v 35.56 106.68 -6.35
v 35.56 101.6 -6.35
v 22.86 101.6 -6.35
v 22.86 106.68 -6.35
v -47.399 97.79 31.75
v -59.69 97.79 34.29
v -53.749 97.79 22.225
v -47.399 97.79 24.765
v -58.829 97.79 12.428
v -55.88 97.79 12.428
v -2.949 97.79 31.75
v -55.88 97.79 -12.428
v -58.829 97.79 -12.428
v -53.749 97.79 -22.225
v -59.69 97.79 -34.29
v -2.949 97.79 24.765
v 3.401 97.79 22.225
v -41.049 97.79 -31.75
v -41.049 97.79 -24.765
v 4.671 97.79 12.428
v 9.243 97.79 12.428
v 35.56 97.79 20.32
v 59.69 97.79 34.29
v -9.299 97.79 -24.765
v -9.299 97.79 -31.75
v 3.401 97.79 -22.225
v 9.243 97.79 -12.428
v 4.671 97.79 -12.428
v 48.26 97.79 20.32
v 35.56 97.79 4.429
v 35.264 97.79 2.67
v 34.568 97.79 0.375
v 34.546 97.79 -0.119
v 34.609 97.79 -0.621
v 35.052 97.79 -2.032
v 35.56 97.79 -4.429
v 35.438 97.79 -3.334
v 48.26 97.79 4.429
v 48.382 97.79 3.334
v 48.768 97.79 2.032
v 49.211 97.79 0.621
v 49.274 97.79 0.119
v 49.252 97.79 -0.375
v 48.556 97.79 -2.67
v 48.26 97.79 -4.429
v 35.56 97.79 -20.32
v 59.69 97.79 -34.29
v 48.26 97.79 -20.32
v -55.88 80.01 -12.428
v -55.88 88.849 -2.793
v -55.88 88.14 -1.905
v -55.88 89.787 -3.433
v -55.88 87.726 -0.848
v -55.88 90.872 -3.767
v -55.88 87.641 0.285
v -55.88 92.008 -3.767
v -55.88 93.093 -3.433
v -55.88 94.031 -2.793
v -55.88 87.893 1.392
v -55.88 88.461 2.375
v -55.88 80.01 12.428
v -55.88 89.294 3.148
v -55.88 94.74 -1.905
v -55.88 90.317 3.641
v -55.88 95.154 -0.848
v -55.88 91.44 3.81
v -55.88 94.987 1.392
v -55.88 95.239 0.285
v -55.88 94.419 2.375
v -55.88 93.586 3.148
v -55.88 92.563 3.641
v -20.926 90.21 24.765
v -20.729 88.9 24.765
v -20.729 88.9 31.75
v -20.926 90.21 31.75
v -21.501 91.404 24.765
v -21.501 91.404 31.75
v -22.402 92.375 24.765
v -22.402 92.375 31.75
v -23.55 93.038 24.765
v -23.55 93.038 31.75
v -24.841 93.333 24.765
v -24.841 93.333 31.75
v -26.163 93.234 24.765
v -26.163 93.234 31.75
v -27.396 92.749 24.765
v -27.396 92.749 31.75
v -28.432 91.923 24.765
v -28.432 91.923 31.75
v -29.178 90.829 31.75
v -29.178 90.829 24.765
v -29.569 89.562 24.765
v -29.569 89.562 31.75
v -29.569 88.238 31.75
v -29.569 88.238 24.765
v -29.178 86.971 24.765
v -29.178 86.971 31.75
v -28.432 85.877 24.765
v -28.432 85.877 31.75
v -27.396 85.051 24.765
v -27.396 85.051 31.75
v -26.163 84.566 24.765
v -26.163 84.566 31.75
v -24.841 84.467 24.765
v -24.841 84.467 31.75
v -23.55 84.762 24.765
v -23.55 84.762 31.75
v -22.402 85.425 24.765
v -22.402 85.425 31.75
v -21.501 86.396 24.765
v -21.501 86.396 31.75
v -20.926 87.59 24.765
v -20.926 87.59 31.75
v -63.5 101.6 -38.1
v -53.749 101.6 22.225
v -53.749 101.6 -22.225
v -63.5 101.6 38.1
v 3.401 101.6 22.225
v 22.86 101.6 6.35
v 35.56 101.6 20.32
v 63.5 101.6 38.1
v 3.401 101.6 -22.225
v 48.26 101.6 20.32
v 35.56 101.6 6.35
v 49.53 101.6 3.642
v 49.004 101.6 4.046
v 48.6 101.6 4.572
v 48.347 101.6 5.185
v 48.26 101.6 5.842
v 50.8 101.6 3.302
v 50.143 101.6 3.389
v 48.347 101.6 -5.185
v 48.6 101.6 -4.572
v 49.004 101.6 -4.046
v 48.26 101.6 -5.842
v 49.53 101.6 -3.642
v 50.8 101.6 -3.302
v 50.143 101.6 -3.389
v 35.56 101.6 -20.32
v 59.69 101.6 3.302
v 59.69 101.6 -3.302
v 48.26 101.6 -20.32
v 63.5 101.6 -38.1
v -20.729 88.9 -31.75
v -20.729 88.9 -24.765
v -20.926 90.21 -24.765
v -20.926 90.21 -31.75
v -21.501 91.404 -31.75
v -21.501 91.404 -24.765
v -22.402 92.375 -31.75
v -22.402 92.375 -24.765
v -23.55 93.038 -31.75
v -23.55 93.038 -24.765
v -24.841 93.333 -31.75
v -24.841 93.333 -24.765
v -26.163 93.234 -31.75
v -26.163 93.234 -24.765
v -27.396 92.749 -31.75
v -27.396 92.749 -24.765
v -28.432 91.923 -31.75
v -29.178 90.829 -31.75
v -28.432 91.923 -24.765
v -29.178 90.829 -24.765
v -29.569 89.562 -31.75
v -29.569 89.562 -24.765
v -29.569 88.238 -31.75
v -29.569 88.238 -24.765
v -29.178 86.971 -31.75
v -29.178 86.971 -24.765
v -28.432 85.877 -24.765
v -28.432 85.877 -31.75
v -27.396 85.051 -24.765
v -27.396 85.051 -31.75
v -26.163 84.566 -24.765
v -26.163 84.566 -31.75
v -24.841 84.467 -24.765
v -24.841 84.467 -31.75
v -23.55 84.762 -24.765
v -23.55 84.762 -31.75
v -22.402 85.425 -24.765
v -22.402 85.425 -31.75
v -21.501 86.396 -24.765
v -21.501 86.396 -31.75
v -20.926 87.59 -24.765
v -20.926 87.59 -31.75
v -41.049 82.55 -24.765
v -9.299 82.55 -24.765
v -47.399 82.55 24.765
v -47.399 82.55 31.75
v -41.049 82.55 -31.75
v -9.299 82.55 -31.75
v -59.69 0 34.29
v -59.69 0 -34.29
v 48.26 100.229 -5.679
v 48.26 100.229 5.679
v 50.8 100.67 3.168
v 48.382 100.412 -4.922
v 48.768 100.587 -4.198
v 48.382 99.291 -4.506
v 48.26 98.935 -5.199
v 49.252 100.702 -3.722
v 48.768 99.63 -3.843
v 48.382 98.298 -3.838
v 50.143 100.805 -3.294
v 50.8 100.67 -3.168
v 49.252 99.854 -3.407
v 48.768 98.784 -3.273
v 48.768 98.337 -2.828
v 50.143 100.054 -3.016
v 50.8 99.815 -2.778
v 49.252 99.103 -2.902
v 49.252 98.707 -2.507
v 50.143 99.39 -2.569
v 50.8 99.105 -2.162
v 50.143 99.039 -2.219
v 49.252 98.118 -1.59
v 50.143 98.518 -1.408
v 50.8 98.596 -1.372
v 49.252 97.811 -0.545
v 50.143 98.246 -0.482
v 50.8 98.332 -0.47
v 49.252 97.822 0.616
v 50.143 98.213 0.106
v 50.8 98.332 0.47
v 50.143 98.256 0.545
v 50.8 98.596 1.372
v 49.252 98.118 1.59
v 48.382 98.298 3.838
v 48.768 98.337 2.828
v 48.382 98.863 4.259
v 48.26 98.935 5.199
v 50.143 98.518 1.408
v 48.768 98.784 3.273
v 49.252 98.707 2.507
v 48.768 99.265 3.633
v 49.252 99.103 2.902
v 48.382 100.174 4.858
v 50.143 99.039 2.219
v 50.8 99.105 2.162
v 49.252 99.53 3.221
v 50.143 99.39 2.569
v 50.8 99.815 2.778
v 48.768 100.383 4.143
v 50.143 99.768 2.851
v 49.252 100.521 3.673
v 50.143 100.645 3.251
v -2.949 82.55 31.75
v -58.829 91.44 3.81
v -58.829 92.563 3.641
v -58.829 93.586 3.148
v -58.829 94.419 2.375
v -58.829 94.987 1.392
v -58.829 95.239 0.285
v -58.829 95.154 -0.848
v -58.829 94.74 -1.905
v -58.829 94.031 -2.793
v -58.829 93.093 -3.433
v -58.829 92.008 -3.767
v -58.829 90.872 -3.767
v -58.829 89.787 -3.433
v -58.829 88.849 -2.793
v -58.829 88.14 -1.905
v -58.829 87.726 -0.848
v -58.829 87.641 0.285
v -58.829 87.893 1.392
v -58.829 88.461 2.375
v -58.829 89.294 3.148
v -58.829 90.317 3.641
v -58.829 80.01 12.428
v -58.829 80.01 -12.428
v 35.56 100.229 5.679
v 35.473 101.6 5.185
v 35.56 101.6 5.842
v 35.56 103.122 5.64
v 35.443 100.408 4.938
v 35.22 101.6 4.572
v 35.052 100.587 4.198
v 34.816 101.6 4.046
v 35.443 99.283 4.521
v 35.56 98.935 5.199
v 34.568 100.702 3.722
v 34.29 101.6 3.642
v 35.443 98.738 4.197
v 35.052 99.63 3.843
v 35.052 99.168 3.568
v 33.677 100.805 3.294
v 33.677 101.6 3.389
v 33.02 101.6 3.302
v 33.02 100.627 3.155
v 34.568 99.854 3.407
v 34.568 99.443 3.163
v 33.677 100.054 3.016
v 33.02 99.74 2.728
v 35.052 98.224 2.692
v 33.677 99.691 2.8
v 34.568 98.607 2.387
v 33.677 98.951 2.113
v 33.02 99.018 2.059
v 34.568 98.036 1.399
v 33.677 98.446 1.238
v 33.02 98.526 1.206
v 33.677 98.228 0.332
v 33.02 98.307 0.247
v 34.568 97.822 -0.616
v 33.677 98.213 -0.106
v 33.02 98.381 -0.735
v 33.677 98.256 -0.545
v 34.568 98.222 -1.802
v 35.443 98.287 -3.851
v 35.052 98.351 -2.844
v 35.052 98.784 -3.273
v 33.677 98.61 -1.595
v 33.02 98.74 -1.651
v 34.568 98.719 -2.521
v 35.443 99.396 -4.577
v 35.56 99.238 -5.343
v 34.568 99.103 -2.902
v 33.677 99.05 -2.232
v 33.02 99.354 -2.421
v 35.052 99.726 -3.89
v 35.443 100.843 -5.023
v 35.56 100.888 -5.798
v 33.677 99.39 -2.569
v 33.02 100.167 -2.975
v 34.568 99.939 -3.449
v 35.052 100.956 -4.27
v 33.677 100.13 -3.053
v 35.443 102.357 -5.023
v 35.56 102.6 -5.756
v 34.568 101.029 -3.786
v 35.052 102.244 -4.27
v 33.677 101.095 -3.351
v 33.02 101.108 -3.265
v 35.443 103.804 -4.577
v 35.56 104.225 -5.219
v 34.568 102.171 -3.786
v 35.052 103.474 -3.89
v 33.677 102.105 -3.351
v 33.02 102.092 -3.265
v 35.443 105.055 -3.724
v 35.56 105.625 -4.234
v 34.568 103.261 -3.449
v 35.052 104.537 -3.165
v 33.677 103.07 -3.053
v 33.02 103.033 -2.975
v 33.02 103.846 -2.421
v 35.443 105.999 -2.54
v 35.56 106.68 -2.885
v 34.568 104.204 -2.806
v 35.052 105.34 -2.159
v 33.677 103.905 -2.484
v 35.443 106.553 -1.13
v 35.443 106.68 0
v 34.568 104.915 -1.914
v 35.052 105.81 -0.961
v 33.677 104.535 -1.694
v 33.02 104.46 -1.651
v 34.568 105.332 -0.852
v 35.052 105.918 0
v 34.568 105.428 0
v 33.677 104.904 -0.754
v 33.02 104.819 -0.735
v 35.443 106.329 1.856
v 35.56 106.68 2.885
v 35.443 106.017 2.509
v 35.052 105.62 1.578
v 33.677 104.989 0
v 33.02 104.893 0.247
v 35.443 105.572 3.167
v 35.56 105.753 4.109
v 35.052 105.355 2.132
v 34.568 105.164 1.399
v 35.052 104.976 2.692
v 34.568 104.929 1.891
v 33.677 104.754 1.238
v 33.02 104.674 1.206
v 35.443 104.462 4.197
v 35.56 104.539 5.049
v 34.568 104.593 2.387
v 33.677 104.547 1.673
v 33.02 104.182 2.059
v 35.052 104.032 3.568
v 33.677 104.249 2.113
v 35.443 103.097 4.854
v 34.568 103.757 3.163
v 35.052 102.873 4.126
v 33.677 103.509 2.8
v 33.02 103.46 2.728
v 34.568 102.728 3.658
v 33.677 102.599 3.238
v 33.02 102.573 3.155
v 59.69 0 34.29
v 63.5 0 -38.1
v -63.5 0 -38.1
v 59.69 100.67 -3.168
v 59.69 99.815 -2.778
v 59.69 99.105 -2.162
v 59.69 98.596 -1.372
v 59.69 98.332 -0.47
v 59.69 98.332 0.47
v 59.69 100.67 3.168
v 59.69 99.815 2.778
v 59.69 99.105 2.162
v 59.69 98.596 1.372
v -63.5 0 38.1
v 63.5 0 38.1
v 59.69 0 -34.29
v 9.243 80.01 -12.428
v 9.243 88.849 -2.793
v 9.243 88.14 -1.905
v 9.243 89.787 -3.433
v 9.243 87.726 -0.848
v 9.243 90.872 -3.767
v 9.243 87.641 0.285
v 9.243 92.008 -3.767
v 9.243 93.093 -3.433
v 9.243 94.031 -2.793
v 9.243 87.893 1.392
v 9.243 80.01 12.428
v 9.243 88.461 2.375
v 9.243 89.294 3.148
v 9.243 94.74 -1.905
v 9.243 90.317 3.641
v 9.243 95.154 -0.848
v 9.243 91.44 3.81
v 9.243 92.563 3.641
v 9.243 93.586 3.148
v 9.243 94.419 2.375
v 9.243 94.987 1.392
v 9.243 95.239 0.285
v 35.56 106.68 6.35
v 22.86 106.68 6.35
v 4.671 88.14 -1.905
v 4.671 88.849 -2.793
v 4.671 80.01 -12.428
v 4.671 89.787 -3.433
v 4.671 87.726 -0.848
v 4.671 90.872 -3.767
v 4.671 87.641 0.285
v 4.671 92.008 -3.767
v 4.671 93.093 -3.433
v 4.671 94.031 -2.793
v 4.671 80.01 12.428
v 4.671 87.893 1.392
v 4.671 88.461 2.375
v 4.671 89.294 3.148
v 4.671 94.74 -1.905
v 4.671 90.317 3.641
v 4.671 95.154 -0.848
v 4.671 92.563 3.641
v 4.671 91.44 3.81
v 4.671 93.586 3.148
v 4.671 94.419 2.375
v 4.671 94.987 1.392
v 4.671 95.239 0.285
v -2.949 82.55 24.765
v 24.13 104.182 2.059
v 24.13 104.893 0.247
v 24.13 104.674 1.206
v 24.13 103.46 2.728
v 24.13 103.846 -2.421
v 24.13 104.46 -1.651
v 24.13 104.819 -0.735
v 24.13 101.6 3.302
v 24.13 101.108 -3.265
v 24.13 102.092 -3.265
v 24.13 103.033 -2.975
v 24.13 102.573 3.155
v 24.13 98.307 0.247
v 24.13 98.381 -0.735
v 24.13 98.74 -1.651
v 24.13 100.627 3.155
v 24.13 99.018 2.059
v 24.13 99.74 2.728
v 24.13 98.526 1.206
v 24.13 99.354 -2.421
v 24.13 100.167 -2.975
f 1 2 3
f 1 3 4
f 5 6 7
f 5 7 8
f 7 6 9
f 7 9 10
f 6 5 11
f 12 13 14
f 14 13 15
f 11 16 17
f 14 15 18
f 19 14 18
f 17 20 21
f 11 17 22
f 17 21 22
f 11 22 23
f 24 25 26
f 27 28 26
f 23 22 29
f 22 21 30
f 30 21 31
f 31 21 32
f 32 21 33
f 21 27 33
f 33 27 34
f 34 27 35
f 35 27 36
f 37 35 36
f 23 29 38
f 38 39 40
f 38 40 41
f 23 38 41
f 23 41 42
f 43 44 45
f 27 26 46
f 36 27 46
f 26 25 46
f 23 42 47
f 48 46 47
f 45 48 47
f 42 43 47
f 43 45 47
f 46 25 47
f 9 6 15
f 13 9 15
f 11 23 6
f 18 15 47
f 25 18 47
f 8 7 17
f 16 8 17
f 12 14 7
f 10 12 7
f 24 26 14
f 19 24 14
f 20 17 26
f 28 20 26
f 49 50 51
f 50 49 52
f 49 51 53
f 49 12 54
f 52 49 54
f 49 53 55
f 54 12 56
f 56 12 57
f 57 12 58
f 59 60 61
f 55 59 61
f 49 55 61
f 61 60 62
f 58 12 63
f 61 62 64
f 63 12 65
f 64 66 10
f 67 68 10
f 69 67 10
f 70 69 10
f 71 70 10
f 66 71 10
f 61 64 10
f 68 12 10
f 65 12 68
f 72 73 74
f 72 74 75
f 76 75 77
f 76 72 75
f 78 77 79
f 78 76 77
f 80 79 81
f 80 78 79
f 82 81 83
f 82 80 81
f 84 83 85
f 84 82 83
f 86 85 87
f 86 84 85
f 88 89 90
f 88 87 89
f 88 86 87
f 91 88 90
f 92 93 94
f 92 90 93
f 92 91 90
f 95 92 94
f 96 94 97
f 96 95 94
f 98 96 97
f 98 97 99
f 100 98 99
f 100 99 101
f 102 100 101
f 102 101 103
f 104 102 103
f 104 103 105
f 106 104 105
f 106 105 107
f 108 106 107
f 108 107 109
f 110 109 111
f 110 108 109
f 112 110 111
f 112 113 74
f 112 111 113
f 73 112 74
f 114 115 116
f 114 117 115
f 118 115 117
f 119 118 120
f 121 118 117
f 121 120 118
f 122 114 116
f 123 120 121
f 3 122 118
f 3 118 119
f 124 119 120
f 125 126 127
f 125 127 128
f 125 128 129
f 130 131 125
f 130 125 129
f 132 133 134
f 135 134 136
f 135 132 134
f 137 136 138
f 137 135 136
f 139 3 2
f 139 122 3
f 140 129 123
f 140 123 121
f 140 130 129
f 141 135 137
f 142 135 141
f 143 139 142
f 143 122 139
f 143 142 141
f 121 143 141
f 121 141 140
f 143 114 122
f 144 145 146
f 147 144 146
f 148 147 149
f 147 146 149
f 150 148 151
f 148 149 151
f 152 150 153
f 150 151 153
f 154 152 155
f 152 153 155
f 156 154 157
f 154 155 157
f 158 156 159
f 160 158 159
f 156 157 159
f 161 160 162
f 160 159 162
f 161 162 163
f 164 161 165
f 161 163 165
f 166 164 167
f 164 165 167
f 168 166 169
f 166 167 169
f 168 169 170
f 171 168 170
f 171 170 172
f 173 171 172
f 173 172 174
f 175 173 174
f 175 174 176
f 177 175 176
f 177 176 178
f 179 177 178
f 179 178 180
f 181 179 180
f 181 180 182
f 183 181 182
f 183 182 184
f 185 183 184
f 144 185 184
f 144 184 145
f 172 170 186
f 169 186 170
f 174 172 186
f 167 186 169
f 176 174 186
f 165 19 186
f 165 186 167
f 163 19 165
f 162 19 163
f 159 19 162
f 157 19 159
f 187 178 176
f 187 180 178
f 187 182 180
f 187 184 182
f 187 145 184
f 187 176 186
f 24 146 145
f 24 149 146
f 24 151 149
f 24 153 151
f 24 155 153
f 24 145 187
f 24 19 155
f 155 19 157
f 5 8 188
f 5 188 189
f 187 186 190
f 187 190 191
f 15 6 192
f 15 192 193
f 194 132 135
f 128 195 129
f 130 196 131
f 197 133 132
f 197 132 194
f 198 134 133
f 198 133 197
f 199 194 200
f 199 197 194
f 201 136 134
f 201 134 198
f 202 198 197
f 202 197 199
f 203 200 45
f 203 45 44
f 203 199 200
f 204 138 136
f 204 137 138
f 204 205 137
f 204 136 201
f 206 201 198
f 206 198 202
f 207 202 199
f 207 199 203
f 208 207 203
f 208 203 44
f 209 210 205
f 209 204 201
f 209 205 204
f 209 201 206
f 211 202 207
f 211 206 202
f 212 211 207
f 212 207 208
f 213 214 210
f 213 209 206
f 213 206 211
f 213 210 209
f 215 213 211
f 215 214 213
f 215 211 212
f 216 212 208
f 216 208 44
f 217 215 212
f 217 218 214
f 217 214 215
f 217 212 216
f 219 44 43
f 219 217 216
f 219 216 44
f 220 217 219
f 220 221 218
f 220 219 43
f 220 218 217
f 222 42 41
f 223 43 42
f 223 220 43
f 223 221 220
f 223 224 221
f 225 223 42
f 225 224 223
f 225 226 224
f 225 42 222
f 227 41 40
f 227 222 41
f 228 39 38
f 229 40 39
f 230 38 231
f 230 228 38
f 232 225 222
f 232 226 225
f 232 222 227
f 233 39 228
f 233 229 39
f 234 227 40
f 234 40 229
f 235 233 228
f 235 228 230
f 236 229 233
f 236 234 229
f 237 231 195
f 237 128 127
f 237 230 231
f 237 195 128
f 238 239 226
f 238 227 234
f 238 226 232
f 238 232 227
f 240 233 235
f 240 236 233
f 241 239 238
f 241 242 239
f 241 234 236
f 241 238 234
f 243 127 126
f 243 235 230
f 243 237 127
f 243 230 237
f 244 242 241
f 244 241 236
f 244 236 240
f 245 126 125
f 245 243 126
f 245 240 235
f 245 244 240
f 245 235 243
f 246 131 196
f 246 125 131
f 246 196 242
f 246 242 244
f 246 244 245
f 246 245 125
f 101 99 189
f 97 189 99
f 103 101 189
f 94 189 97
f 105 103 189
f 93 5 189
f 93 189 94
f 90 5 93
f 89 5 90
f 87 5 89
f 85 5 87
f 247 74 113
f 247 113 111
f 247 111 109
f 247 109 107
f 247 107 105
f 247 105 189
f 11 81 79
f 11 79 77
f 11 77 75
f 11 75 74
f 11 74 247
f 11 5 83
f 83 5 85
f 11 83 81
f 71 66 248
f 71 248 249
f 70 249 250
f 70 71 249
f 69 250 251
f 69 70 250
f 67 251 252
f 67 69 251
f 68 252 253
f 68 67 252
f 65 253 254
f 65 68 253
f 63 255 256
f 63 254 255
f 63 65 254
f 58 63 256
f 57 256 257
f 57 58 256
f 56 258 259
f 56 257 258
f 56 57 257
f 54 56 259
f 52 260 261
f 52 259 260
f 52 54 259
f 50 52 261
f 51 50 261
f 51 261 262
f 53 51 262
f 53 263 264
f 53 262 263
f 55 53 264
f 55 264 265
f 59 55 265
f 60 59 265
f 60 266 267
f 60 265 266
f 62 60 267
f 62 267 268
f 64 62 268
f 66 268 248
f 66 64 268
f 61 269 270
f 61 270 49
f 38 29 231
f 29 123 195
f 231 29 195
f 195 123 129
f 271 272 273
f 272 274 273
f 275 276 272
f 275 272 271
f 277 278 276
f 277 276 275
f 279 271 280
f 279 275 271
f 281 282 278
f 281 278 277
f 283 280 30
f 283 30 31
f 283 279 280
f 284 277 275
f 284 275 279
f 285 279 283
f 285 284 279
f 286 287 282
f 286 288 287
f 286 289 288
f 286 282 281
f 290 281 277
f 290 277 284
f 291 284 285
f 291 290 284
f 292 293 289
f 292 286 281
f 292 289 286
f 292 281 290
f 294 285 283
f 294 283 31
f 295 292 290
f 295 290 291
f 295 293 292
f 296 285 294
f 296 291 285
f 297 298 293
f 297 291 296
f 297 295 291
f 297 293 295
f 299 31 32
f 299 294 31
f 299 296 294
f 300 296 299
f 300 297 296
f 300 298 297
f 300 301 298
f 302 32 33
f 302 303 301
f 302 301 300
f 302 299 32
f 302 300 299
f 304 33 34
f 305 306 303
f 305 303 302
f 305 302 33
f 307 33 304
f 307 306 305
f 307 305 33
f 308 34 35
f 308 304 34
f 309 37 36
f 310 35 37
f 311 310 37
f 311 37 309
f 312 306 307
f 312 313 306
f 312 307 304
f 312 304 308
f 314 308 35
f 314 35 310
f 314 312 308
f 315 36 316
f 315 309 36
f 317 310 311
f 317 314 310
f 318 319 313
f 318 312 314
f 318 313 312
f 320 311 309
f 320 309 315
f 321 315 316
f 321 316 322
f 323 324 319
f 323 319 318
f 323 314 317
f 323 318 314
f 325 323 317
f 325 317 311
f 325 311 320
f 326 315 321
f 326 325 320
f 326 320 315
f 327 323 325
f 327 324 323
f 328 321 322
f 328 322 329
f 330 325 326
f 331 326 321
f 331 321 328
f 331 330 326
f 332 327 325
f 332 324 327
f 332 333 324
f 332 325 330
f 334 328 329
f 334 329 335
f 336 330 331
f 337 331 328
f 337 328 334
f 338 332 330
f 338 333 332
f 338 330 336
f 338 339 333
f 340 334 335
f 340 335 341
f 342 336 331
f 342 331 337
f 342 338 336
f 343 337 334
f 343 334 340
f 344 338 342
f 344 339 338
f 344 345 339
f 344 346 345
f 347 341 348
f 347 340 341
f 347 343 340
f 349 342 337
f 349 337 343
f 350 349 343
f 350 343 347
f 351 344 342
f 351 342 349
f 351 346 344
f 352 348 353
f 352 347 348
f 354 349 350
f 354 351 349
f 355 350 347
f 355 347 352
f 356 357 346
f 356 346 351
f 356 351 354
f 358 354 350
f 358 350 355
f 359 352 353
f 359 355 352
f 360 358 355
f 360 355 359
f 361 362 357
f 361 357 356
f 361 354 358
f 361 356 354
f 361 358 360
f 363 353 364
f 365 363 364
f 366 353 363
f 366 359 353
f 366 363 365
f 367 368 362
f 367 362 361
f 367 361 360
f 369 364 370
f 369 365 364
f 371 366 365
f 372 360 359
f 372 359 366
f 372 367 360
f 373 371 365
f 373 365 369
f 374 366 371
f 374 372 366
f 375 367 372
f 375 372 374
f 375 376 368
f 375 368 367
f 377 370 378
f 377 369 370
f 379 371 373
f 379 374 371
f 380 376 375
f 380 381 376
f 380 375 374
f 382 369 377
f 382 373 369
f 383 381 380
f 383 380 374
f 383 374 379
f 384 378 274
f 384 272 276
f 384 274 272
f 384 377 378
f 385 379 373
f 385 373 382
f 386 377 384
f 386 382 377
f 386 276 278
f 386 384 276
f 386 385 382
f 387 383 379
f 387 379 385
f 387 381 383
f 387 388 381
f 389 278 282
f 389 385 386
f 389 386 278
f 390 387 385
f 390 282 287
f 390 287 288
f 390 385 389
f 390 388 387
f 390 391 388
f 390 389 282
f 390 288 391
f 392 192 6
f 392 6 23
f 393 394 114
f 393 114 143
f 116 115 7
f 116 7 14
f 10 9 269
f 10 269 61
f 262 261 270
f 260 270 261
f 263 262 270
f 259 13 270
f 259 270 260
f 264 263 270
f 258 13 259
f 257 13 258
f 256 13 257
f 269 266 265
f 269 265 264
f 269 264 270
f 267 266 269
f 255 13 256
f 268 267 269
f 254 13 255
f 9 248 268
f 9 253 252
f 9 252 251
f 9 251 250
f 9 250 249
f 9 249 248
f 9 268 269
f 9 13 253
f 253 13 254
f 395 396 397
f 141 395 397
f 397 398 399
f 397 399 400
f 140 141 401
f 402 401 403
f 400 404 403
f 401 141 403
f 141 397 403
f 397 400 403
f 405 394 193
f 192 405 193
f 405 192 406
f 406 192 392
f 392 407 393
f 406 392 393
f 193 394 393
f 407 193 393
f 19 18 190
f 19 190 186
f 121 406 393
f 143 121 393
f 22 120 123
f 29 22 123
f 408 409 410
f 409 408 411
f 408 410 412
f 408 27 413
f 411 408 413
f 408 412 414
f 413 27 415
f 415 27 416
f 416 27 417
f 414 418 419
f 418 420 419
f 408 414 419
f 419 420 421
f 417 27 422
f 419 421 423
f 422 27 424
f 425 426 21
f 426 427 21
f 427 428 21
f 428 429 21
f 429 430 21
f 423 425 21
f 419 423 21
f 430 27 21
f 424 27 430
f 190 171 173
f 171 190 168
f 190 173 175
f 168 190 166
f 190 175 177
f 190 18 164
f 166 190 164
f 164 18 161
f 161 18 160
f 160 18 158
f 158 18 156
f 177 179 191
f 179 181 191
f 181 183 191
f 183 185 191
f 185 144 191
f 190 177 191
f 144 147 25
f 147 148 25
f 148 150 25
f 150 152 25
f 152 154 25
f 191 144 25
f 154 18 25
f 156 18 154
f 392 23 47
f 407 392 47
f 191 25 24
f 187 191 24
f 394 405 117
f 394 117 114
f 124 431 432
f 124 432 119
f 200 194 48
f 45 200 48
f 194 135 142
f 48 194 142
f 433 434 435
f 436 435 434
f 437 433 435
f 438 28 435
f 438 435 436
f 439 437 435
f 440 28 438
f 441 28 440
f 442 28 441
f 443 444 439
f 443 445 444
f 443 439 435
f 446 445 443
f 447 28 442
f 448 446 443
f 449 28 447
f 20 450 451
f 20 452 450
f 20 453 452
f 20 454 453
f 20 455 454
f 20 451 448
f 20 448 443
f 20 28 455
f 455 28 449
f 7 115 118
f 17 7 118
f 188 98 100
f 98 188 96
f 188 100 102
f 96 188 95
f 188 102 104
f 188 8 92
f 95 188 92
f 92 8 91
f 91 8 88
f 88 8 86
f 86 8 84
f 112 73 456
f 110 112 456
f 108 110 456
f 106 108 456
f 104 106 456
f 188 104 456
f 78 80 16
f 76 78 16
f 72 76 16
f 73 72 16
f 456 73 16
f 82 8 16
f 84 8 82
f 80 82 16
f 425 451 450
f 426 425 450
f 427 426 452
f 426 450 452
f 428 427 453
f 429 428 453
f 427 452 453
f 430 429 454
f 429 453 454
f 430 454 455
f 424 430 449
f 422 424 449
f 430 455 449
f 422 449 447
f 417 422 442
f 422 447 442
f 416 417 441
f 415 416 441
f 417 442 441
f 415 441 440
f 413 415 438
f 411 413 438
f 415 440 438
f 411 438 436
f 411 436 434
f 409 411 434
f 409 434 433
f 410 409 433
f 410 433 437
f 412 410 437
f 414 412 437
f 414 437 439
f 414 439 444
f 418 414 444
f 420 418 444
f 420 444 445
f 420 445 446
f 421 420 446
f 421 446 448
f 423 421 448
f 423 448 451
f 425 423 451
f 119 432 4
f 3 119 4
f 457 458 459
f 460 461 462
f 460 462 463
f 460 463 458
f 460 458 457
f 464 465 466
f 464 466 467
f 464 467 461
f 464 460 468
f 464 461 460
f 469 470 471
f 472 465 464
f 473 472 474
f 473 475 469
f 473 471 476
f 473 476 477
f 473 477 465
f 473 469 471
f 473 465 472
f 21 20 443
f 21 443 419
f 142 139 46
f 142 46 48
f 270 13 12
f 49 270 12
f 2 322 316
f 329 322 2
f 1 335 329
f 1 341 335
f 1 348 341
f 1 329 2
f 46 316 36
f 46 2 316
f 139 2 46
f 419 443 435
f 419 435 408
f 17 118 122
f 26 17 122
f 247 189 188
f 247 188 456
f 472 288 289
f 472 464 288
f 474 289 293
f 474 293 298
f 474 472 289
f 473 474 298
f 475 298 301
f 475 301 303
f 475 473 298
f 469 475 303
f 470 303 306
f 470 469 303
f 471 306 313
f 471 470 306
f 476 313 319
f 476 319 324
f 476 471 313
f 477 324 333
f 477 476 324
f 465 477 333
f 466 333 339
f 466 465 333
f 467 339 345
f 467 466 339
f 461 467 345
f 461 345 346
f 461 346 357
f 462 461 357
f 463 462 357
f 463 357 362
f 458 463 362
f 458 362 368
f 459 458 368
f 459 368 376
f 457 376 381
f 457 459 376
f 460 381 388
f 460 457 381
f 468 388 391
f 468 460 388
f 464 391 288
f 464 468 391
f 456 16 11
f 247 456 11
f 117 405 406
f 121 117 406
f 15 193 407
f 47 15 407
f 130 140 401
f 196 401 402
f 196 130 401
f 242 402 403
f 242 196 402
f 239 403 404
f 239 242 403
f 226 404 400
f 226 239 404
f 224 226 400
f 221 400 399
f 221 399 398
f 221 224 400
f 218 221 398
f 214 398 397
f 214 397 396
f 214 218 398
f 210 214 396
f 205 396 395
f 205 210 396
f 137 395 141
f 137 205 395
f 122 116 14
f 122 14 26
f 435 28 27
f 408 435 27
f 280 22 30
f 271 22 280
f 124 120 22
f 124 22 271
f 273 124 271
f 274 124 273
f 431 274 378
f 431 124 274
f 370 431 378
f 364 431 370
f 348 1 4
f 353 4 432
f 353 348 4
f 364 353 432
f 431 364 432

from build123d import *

# Parameters (mm, degrees)
SKETCH1_W                           = 127
SKETCH1_H                           = 76.2
MAIN_BODY_DEPTH                     = 101.6
HOLLOW_IT_T                         = -3.81
HOLE_FOR_SCROLLWHEEL_REACH          = 127.724
SKETCH2_W                           = 12.7
SKETCH2_H                           = 40.64
NIBBLE_BASE_HOLE_DEPTH              = 12.7
NIBBLE_HOLE_DEPTH                   = 24.13
NIBBLE_HOLE_DEPTH_BACK              = 11.43
SKETCH5_R                           = 3.302
EASY_TO_INSERT_SCROLL_WHEEL_R       = 2.54
SKETCH6_W                           = 57.15
SKETCH6_H                           = 44.45
HOLE_FOR_JOYSTICK_DEPTH             = 11.43
SKETCH10_W                          = 44.45
SKETCH10_H                          = 6.985
SKETCH10_W_2                        = 31.75
BOX_NIBBLE_BASE_DEPTH               = 15.24
SKETCH11_W                          = 4.572
SKETCH11_H                          = 24.856466434
SKETCH11_W_2                        = 2.948658359
ARCH_NIBBLE_BASE_DEPTH              = 17.78
ARCH_NIBBLE_HOLES_REACH             = 134.21
SKETCH12_R                          = 3.81
ARCH_NIBBLE_HOLES_DIRECTION_2_REACH = 134.21
BOX_NIBBLE_HOLES_REACH              = 141.158
SKETCH13_R                          = 4.445
BOX_NIBBLE_HOLES_DIRECTION_2_REACH  = 141.158


with BuildPart() as part:
    # Sketch1 → main body (new body)
    with BuildSketch(Plane(origin=(0, 0, 0), x_dir=(1, 0, 0), z_dir=(0, 1, 0))):
        Rectangle(SKETCH1_W, SKETCH1_H)
    extrude(amount=MAIN_BODY_DEPTH)

    # hollow it
    hollow_it_openings = [part.faces().sort_by_distance(p)[0] for p in [
        (0, 0, 0),
    ]]
    offset(amount=HOLLOW_IT_T, openings=hollow_it_openings, kind=Kind.INTERSECTION)

    # Sketch2 → hole for scrollwheel (cut, up to next)
    with BuildSketch(Plane(origin=(0, 101.6, 0), x_dir=(1, 0, 0), z_dir=(0, 1, 0)), mode=Mode.PRIVATE) as hole_for_scrollwheel_sk1:
        with Locations((41.91, 0)):
            Rectangle(SKETCH2_W, SKETCH2_H)
    hole_for_scrollwheel_tool1 = extrude(hole_for_scrollwheel_sk1.sketch, amount=-HOLE_FOR_SCROLLWHEEL_REACH, mode=Mode.PRIVATE) & part.part
    add(hole_for_scrollwheel_tool1.solids().sort_by_distance((41.91, 101.6, 0))[0], mode=Mode.SUBTRACT)

    # Sketch3 → nibble base hole (add)
    with BuildSketch(Plane(origin=(35.56, 0, 0), x_dir=(0, 0, -1), z_dir=(1, 0, 0))):
        Polygon((0, 101.6), (6.35, 101.6), (6.35, 106.68), (-6.35, 106.68), (-6.35, 101.6), align=None)
    extrude(amount=-NIBBLE_BASE_HOLE_DEPTH)

    # Sketch5 → nibble hole (cut, two sides: drawn at the far end of the back side and taken through both)
    with BuildSketch(Plane(origin=(35.56, 0, 0), x_dir=(0, 0, -1), z_dir=(1, 0, 0)).offset(-NIBBLE_HOLE_DEPTH_BACK)):
        with Locations(Location((0, 101.6, 0), (0, 0, 180))):
            Circle(SKETCH5_R)
    extrude(amount=NIBBLE_HOLE_DEPTH + NIBBLE_HOLE_DEPTH_BACK, mode=Mode.SUBTRACT)

    # easy to insert scroll wheel
    # the kernel refuses this fillet: 2.54 mm, written as the material it takes off along each edge
    with BuildSketch(Plane(origin=(48.26, 101.6, 0), x_dir=(0, 0.9999950652018582, -0.0031415874858792044), z_dir=(0, 0.0031415874858792044, 0.9999950652018582))) as easy_to_insert_scroll_wheel_piece_1:
        with BuildLine():
            CenterArc((3.302 + EASY_TO_INSERT_SCROLL_WHEEL_R, -EASY_TO_INSERT_SCROLL_WHEEL_R), EASY_TO_INSERT_SCROLL_WHEEL_R, 90, 90)
            Line((3.302, -EASY_TO_INSERT_SCROLL_WHEEL_R), (3.302, 0))
            Line((3.302, 0), (3.302 + EASY_TO_INSERT_SCROLL_WHEEL_R, 0))
        make_face()
    revolve(axis=Axis((48.26, 101.6, 0), (-1, 0, 0)), revolution_arc=359.64, mode=Mode.SUBTRACT)
    with BuildSketch(Plane(origin=(35.56, 101.6, 0), x_dir=(0, 0, 1), z_dir=(0, 1, 0))) as easy_to_insert_scroll_wheel_piece_2:
        with BuildLine():
            CenterArc((3.302 + EASY_TO_INSERT_SCROLL_WHEEL_R, -EASY_TO_INSERT_SCROLL_WHEEL_R), EASY_TO_INSERT_SCROLL_WHEEL_R, 90, 90)
            Line((3.302, -EASY_TO_INSERT_SCROLL_WHEEL_R), (3.302, 0))
            Line((3.302, 0), (3.302 + EASY_TO_INSERT_SCROLL_WHEEL_R, 0))
        make_face()
    revolve(axis=Axis((35.56, 101.6, 0), (1, 0, 0)), mode=Mode.SUBTRACT)

    # Sketch6 → hole for joystick (cut)
    with BuildSketch(Plane(origin=(0, 101.6, 0), x_dir=(1, 0, 0), z_dir=(0, 1, 0))):
        with Locations((-25.173658359, 0)):
            Rectangle(SKETCH6_W, SKETCH6_H)
    extrude(amount=-HOLE_FOR_JOYSTICK_DEPTH, mode=Mode.SUBTRACT)

    # Sketch10 → box nibble base (add)
    with BuildSketch(Plane.XZ.offset(-97.79)):
        with Locations((-25.173658359, 28.2575)):
            Rectangle(SKETCH10_W, SKETCH10_H)
        with Locations((-25.173658359, -28.2575)):
            Rectangle(SKETCH10_W_2, SKETCH10_H)
    extrude(amount=BOX_NIBBLE_BASE_DEPTH)

    # Sketch11 → arch nibble base (add)
    with BuildSketch(Plane.XZ.offset(-97.79)):
        with Locations((6.957341641, 0)):
            Rectangle(SKETCH11_W, SKETCH11_H)
        with Locations((-57.354329179, 0)):
            Rectangle(SKETCH11_W_2, SKETCH11_H)
    extrude(amount=ARCH_NIBBLE_BASE_DEPTH)

    # arch nibble holes: up to this face of the body (flat: up to its plane)
    arch_nibble_holes_end = Plane(part.part.faces().sort_by_distance((9.243341641, 88.9, 0))[0])
    # Sketch12 → arch nibble holes (cut, up to the picked face)
    with BuildSketch(Plane.ZY.offset(-4.671341641), mode=Mode.PRIVATE) as arch_nibble_holes_sk1:
        with Locations((0, 91.44)):
            Circle(SKETCH12_R)
    arch_nibble_holes_tool1 = split(extrude(arch_nibble_holes_sk1.sketch, amount=-ARCH_NIBBLE_HOLES_REACH, mode=Mode.PRIVATE), bisect_by=arch_nibble_holes_end, keep=Keep.BOTH, mode=Mode.PRIVATE)
    add(arch_nibble_holes_tool1.solids().sort_by(Axis((4.671342, 91.44, 0), (1, 0, 0)))[0], mode=Mode.SUBTRACT)

    # arch nibble holes direction 2: up to this face of the body (flat: up to its plane)
    arch_nibble_holes_direction_2_end = Plane(part.part.faces().sort_by_distance((-59.69, 48.895, 0))[0])
    # Sketch12 → arch nibble holes direction 2 (cut, up to the picked face)
    with BuildSketch(Plane.ZY.offset(-4.671341641), mode=Mode.PRIVATE) as arch_nibble_holes_direction_2_sk1:
        with Locations((0, 91.44)):
            Circle(SKETCH12_R)
    arch_nibble_holes_direction_2_tool1 = split(extrude(arch_nibble_holes_direction_2_sk1.sketch, amount=ARCH_NIBBLE_HOLES_DIRECTION_2_REACH, mode=Mode.PRIVATE), bisect_by=arch_nibble_holes_direction_2_end, keep=Keep.BOTH, mode=Mode.PRIVATE)
    add(arch_nibble_holes_direction_2_tool1.solids().sort_by(Axis((4.671342, 91.44, 0), (-1, 0, 0)))[0], mode=Mode.SUBTRACT)

    # box nibble holes: up to this face of the body (flat: up to its plane)
    box_nibble_holes_end = Plane(part.part.faces().sort_by_distance((0, 48.895, -34.29))[0])
    # Sketch13 → box nibble holes (cut, up to the picked face)
    with BuildSketch(Plane.XY.offset(-24.765), mode=Mode.PRIVATE) as box_nibble_holes_sk1:
        with Locations((-25.173658359, 88.9)):
            Circle(SKETCH13_R)
    box_nibble_holes_tool1 = split(extrude(box_nibble_holes_sk1.sketch, amount=-BOX_NIBBLE_HOLES_REACH, mode=Mode.PRIVATE), bisect_by=box_nibble_holes_end, keep=Keep.BOTH, mode=Mode.PRIVATE)
    add(box_nibble_holes_tool1.solids().sort_by(Axis((-25.173658, 88.9, -24.765), (0, 0, -1)))[0], mode=Mode.SUBTRACT)

    # box nibble holes direction 2: up to this face of the body (flat: up to its plane)
    box_nibble_holes_direction_2_end = Plane(part.part.faces().sort_by_distance((0, 48.895, 34.29))[0])
    # Sketch13 → box nibble holes direction 2 (cut, up to the picked face)
    with BuildSketch(Plane.XY.offset(-24.765), mode=Mode.PRIVATE) as box_nibble_holes_direction_2_sk1:
        with Locations((-25.173658359, 88.9)):
            Circle(SKETCH13_R)
    box_nibble_holes_direction_2_tool1 = split(extrude(box_nibble_holes_direction_2_sk1.sketch, amount=BOX_NIBBLE_HOLES_DIRECTION_2_REACH, mode=Mode.PRIVATE), bisect_by=box_nibble_holes_direction_2_end, keep=Keep.BOTH, mode=Mode.PRIVATE)
    add(box_nibble_holes_direction_2_tool1.solids().sort_by(Axis((-25.173658, 88.9, -24.765), (0, 0, 1)))[0], mode=Mode.SUBTRACT)


solid = part.part
